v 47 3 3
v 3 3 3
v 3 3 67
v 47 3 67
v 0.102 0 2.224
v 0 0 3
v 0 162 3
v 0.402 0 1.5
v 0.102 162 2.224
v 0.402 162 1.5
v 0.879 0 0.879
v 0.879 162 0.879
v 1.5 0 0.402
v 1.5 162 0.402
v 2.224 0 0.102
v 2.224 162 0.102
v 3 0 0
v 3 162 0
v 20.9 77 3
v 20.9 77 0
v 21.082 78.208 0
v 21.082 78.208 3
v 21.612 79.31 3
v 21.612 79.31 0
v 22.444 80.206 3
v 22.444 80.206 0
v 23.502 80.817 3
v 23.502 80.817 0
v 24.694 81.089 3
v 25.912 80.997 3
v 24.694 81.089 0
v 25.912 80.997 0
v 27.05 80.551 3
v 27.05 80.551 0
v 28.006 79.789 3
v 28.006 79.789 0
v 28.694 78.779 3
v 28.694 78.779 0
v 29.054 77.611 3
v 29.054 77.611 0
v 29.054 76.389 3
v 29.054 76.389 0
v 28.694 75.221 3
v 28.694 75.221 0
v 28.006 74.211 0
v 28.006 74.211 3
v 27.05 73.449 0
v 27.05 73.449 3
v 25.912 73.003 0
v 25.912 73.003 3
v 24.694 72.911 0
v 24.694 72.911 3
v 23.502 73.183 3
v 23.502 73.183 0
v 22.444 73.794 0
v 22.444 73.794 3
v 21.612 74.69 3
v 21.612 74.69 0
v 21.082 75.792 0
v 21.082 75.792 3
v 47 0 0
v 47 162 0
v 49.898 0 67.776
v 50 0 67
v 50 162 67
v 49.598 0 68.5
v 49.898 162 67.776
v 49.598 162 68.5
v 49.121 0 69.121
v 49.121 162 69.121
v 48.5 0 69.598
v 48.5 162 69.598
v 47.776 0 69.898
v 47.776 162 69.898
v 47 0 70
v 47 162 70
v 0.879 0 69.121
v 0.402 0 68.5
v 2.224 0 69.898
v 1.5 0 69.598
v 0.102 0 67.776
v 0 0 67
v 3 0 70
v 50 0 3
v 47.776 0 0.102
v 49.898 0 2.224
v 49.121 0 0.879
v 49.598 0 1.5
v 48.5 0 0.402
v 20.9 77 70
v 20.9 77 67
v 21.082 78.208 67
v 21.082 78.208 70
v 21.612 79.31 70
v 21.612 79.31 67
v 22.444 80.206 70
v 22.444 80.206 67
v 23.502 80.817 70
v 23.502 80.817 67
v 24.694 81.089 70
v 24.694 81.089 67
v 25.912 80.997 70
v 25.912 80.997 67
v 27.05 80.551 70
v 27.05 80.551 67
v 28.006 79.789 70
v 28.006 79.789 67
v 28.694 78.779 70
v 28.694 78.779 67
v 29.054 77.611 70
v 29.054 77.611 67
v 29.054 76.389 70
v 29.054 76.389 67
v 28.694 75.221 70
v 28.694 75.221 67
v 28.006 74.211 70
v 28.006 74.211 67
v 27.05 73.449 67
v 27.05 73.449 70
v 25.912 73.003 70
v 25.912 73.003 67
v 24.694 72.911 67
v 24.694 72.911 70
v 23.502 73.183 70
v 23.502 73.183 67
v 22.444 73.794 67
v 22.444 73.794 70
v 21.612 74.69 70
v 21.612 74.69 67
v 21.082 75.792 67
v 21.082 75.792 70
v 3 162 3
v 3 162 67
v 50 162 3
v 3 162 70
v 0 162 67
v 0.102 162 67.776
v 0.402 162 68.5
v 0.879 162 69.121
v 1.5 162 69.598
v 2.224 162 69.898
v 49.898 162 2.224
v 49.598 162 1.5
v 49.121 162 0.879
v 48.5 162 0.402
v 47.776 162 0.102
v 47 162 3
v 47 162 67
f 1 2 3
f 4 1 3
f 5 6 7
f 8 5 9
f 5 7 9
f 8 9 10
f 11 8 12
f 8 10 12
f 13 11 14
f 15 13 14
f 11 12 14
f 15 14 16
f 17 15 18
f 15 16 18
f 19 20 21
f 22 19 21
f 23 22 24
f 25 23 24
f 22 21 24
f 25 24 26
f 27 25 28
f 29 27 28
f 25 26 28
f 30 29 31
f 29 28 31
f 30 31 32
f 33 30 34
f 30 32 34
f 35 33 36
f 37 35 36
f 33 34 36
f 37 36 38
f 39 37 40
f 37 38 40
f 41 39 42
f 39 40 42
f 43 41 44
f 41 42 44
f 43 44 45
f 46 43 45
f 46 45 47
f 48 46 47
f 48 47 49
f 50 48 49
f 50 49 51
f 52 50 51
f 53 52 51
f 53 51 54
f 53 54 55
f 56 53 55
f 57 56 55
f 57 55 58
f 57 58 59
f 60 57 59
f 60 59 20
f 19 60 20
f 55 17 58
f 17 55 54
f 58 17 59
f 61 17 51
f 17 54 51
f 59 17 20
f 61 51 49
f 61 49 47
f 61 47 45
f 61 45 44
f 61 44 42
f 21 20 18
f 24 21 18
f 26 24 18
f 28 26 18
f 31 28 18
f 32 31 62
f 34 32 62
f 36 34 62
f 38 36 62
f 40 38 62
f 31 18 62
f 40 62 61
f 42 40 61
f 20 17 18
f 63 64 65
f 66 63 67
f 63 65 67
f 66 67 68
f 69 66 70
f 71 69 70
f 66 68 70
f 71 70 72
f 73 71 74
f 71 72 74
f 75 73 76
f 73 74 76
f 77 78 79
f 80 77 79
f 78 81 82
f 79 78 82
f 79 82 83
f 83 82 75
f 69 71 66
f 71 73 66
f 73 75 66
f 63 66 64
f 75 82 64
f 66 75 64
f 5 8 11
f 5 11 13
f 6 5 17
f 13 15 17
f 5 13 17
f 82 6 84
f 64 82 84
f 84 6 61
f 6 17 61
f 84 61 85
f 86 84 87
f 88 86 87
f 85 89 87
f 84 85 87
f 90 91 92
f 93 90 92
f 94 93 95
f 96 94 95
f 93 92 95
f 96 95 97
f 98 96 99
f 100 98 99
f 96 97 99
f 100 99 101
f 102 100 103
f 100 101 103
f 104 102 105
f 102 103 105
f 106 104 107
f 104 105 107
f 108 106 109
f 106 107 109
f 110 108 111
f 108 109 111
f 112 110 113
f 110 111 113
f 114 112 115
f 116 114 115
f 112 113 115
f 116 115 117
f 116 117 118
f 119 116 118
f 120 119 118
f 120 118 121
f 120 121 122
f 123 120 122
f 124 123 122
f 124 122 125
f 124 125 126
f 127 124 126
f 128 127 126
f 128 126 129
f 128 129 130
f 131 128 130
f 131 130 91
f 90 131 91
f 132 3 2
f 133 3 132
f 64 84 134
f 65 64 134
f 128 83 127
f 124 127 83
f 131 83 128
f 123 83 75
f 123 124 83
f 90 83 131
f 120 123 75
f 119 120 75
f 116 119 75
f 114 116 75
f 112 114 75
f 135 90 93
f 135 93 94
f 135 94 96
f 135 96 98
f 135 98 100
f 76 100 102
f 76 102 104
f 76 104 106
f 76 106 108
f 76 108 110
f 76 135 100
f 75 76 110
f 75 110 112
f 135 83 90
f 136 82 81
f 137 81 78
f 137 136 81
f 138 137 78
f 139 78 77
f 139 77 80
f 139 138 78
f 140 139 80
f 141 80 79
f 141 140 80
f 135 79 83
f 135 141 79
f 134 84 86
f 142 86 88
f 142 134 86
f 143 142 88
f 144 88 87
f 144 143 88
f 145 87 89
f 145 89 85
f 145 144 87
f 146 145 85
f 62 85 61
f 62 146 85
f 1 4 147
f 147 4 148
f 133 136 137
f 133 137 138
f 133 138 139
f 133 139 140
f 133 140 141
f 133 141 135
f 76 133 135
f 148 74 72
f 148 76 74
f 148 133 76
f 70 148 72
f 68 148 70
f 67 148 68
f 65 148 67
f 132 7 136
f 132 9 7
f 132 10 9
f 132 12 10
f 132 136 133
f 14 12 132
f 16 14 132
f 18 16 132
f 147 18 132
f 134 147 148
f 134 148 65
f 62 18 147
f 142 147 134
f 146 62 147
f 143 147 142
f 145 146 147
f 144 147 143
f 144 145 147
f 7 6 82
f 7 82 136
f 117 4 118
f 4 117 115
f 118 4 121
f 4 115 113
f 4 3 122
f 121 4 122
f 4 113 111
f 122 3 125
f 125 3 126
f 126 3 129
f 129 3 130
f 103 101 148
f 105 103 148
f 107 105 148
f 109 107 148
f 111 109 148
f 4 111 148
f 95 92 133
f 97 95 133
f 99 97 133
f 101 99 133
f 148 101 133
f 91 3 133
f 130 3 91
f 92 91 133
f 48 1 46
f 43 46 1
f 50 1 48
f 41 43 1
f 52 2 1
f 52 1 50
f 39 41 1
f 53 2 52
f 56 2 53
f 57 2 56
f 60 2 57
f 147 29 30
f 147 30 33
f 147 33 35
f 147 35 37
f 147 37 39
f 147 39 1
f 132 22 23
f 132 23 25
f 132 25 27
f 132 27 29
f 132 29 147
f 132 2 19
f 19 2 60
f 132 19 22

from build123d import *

# Parameters (mm, degrees)
SKETCH_1_W         = 50
SKETCH_1_H         = 162
BLOCKEXTRUDE_DEPTH = 70
FILLET_2_R         = 3
SHELL_START        = 3
SHELL_1_OUTLINE_W  = 159
SHELL_1_OUTLINE_H  = 64
SHELL_1_DEPTH      = 44
SKETCH_2_R         = 4.1
CABLE_ENTRY_DEPTH  = 184.423008371


# Read off the part's stored shape, not the designer's step: 抽壳1
with BuildPart() as part:
    # 草图1 → BlockExtrude (new body)
    with BuildSketch(Plane.XY):
        with Locations((25, 81)):
            Rectangle(SKETCH_1_W, SKETCH_1_H)
    extrude(amount=BLOCKEXTRUDE_DEPTH)

    # Fillet 2
    fillet_2_edges = [part.edges().sort_by_distance(p)[0] for p in [
        (50, 81, 70),
        (0, 81, 70),
        (50, 81, 0),
        (0, 81, 0),
    ]]
    fillet(fillet_2_edges, radius=FILLET_2_R)

    # 抽壳1 outline → 抽壳1 (cut)
    with BuildSketch(Plane.YZ.offset(SHELL_START)):
        with Locations((82.5, 35)):
            Rectangle(SHELL_1_OUTLINE_W, SHELL_1_OUTLINE_H)
    extrude(amount=SHELL_1_DEPTH, mode=Mode.SUBTRACT)

    # 草图2 → Cable_entry (cut, through all)
    with BuildSketch(Plane(origin=(0, 0, 0), x_dir=(-1, 0, 0), z_dir=(0, 0, -1))):
        with Locations((-25, 77)):
            Circle(SKETCH_2_R)
    extrude(amount=-CABLE_ENTRY_DEPTH, mode=Mode.SUBTRACT)


solid = part.part
